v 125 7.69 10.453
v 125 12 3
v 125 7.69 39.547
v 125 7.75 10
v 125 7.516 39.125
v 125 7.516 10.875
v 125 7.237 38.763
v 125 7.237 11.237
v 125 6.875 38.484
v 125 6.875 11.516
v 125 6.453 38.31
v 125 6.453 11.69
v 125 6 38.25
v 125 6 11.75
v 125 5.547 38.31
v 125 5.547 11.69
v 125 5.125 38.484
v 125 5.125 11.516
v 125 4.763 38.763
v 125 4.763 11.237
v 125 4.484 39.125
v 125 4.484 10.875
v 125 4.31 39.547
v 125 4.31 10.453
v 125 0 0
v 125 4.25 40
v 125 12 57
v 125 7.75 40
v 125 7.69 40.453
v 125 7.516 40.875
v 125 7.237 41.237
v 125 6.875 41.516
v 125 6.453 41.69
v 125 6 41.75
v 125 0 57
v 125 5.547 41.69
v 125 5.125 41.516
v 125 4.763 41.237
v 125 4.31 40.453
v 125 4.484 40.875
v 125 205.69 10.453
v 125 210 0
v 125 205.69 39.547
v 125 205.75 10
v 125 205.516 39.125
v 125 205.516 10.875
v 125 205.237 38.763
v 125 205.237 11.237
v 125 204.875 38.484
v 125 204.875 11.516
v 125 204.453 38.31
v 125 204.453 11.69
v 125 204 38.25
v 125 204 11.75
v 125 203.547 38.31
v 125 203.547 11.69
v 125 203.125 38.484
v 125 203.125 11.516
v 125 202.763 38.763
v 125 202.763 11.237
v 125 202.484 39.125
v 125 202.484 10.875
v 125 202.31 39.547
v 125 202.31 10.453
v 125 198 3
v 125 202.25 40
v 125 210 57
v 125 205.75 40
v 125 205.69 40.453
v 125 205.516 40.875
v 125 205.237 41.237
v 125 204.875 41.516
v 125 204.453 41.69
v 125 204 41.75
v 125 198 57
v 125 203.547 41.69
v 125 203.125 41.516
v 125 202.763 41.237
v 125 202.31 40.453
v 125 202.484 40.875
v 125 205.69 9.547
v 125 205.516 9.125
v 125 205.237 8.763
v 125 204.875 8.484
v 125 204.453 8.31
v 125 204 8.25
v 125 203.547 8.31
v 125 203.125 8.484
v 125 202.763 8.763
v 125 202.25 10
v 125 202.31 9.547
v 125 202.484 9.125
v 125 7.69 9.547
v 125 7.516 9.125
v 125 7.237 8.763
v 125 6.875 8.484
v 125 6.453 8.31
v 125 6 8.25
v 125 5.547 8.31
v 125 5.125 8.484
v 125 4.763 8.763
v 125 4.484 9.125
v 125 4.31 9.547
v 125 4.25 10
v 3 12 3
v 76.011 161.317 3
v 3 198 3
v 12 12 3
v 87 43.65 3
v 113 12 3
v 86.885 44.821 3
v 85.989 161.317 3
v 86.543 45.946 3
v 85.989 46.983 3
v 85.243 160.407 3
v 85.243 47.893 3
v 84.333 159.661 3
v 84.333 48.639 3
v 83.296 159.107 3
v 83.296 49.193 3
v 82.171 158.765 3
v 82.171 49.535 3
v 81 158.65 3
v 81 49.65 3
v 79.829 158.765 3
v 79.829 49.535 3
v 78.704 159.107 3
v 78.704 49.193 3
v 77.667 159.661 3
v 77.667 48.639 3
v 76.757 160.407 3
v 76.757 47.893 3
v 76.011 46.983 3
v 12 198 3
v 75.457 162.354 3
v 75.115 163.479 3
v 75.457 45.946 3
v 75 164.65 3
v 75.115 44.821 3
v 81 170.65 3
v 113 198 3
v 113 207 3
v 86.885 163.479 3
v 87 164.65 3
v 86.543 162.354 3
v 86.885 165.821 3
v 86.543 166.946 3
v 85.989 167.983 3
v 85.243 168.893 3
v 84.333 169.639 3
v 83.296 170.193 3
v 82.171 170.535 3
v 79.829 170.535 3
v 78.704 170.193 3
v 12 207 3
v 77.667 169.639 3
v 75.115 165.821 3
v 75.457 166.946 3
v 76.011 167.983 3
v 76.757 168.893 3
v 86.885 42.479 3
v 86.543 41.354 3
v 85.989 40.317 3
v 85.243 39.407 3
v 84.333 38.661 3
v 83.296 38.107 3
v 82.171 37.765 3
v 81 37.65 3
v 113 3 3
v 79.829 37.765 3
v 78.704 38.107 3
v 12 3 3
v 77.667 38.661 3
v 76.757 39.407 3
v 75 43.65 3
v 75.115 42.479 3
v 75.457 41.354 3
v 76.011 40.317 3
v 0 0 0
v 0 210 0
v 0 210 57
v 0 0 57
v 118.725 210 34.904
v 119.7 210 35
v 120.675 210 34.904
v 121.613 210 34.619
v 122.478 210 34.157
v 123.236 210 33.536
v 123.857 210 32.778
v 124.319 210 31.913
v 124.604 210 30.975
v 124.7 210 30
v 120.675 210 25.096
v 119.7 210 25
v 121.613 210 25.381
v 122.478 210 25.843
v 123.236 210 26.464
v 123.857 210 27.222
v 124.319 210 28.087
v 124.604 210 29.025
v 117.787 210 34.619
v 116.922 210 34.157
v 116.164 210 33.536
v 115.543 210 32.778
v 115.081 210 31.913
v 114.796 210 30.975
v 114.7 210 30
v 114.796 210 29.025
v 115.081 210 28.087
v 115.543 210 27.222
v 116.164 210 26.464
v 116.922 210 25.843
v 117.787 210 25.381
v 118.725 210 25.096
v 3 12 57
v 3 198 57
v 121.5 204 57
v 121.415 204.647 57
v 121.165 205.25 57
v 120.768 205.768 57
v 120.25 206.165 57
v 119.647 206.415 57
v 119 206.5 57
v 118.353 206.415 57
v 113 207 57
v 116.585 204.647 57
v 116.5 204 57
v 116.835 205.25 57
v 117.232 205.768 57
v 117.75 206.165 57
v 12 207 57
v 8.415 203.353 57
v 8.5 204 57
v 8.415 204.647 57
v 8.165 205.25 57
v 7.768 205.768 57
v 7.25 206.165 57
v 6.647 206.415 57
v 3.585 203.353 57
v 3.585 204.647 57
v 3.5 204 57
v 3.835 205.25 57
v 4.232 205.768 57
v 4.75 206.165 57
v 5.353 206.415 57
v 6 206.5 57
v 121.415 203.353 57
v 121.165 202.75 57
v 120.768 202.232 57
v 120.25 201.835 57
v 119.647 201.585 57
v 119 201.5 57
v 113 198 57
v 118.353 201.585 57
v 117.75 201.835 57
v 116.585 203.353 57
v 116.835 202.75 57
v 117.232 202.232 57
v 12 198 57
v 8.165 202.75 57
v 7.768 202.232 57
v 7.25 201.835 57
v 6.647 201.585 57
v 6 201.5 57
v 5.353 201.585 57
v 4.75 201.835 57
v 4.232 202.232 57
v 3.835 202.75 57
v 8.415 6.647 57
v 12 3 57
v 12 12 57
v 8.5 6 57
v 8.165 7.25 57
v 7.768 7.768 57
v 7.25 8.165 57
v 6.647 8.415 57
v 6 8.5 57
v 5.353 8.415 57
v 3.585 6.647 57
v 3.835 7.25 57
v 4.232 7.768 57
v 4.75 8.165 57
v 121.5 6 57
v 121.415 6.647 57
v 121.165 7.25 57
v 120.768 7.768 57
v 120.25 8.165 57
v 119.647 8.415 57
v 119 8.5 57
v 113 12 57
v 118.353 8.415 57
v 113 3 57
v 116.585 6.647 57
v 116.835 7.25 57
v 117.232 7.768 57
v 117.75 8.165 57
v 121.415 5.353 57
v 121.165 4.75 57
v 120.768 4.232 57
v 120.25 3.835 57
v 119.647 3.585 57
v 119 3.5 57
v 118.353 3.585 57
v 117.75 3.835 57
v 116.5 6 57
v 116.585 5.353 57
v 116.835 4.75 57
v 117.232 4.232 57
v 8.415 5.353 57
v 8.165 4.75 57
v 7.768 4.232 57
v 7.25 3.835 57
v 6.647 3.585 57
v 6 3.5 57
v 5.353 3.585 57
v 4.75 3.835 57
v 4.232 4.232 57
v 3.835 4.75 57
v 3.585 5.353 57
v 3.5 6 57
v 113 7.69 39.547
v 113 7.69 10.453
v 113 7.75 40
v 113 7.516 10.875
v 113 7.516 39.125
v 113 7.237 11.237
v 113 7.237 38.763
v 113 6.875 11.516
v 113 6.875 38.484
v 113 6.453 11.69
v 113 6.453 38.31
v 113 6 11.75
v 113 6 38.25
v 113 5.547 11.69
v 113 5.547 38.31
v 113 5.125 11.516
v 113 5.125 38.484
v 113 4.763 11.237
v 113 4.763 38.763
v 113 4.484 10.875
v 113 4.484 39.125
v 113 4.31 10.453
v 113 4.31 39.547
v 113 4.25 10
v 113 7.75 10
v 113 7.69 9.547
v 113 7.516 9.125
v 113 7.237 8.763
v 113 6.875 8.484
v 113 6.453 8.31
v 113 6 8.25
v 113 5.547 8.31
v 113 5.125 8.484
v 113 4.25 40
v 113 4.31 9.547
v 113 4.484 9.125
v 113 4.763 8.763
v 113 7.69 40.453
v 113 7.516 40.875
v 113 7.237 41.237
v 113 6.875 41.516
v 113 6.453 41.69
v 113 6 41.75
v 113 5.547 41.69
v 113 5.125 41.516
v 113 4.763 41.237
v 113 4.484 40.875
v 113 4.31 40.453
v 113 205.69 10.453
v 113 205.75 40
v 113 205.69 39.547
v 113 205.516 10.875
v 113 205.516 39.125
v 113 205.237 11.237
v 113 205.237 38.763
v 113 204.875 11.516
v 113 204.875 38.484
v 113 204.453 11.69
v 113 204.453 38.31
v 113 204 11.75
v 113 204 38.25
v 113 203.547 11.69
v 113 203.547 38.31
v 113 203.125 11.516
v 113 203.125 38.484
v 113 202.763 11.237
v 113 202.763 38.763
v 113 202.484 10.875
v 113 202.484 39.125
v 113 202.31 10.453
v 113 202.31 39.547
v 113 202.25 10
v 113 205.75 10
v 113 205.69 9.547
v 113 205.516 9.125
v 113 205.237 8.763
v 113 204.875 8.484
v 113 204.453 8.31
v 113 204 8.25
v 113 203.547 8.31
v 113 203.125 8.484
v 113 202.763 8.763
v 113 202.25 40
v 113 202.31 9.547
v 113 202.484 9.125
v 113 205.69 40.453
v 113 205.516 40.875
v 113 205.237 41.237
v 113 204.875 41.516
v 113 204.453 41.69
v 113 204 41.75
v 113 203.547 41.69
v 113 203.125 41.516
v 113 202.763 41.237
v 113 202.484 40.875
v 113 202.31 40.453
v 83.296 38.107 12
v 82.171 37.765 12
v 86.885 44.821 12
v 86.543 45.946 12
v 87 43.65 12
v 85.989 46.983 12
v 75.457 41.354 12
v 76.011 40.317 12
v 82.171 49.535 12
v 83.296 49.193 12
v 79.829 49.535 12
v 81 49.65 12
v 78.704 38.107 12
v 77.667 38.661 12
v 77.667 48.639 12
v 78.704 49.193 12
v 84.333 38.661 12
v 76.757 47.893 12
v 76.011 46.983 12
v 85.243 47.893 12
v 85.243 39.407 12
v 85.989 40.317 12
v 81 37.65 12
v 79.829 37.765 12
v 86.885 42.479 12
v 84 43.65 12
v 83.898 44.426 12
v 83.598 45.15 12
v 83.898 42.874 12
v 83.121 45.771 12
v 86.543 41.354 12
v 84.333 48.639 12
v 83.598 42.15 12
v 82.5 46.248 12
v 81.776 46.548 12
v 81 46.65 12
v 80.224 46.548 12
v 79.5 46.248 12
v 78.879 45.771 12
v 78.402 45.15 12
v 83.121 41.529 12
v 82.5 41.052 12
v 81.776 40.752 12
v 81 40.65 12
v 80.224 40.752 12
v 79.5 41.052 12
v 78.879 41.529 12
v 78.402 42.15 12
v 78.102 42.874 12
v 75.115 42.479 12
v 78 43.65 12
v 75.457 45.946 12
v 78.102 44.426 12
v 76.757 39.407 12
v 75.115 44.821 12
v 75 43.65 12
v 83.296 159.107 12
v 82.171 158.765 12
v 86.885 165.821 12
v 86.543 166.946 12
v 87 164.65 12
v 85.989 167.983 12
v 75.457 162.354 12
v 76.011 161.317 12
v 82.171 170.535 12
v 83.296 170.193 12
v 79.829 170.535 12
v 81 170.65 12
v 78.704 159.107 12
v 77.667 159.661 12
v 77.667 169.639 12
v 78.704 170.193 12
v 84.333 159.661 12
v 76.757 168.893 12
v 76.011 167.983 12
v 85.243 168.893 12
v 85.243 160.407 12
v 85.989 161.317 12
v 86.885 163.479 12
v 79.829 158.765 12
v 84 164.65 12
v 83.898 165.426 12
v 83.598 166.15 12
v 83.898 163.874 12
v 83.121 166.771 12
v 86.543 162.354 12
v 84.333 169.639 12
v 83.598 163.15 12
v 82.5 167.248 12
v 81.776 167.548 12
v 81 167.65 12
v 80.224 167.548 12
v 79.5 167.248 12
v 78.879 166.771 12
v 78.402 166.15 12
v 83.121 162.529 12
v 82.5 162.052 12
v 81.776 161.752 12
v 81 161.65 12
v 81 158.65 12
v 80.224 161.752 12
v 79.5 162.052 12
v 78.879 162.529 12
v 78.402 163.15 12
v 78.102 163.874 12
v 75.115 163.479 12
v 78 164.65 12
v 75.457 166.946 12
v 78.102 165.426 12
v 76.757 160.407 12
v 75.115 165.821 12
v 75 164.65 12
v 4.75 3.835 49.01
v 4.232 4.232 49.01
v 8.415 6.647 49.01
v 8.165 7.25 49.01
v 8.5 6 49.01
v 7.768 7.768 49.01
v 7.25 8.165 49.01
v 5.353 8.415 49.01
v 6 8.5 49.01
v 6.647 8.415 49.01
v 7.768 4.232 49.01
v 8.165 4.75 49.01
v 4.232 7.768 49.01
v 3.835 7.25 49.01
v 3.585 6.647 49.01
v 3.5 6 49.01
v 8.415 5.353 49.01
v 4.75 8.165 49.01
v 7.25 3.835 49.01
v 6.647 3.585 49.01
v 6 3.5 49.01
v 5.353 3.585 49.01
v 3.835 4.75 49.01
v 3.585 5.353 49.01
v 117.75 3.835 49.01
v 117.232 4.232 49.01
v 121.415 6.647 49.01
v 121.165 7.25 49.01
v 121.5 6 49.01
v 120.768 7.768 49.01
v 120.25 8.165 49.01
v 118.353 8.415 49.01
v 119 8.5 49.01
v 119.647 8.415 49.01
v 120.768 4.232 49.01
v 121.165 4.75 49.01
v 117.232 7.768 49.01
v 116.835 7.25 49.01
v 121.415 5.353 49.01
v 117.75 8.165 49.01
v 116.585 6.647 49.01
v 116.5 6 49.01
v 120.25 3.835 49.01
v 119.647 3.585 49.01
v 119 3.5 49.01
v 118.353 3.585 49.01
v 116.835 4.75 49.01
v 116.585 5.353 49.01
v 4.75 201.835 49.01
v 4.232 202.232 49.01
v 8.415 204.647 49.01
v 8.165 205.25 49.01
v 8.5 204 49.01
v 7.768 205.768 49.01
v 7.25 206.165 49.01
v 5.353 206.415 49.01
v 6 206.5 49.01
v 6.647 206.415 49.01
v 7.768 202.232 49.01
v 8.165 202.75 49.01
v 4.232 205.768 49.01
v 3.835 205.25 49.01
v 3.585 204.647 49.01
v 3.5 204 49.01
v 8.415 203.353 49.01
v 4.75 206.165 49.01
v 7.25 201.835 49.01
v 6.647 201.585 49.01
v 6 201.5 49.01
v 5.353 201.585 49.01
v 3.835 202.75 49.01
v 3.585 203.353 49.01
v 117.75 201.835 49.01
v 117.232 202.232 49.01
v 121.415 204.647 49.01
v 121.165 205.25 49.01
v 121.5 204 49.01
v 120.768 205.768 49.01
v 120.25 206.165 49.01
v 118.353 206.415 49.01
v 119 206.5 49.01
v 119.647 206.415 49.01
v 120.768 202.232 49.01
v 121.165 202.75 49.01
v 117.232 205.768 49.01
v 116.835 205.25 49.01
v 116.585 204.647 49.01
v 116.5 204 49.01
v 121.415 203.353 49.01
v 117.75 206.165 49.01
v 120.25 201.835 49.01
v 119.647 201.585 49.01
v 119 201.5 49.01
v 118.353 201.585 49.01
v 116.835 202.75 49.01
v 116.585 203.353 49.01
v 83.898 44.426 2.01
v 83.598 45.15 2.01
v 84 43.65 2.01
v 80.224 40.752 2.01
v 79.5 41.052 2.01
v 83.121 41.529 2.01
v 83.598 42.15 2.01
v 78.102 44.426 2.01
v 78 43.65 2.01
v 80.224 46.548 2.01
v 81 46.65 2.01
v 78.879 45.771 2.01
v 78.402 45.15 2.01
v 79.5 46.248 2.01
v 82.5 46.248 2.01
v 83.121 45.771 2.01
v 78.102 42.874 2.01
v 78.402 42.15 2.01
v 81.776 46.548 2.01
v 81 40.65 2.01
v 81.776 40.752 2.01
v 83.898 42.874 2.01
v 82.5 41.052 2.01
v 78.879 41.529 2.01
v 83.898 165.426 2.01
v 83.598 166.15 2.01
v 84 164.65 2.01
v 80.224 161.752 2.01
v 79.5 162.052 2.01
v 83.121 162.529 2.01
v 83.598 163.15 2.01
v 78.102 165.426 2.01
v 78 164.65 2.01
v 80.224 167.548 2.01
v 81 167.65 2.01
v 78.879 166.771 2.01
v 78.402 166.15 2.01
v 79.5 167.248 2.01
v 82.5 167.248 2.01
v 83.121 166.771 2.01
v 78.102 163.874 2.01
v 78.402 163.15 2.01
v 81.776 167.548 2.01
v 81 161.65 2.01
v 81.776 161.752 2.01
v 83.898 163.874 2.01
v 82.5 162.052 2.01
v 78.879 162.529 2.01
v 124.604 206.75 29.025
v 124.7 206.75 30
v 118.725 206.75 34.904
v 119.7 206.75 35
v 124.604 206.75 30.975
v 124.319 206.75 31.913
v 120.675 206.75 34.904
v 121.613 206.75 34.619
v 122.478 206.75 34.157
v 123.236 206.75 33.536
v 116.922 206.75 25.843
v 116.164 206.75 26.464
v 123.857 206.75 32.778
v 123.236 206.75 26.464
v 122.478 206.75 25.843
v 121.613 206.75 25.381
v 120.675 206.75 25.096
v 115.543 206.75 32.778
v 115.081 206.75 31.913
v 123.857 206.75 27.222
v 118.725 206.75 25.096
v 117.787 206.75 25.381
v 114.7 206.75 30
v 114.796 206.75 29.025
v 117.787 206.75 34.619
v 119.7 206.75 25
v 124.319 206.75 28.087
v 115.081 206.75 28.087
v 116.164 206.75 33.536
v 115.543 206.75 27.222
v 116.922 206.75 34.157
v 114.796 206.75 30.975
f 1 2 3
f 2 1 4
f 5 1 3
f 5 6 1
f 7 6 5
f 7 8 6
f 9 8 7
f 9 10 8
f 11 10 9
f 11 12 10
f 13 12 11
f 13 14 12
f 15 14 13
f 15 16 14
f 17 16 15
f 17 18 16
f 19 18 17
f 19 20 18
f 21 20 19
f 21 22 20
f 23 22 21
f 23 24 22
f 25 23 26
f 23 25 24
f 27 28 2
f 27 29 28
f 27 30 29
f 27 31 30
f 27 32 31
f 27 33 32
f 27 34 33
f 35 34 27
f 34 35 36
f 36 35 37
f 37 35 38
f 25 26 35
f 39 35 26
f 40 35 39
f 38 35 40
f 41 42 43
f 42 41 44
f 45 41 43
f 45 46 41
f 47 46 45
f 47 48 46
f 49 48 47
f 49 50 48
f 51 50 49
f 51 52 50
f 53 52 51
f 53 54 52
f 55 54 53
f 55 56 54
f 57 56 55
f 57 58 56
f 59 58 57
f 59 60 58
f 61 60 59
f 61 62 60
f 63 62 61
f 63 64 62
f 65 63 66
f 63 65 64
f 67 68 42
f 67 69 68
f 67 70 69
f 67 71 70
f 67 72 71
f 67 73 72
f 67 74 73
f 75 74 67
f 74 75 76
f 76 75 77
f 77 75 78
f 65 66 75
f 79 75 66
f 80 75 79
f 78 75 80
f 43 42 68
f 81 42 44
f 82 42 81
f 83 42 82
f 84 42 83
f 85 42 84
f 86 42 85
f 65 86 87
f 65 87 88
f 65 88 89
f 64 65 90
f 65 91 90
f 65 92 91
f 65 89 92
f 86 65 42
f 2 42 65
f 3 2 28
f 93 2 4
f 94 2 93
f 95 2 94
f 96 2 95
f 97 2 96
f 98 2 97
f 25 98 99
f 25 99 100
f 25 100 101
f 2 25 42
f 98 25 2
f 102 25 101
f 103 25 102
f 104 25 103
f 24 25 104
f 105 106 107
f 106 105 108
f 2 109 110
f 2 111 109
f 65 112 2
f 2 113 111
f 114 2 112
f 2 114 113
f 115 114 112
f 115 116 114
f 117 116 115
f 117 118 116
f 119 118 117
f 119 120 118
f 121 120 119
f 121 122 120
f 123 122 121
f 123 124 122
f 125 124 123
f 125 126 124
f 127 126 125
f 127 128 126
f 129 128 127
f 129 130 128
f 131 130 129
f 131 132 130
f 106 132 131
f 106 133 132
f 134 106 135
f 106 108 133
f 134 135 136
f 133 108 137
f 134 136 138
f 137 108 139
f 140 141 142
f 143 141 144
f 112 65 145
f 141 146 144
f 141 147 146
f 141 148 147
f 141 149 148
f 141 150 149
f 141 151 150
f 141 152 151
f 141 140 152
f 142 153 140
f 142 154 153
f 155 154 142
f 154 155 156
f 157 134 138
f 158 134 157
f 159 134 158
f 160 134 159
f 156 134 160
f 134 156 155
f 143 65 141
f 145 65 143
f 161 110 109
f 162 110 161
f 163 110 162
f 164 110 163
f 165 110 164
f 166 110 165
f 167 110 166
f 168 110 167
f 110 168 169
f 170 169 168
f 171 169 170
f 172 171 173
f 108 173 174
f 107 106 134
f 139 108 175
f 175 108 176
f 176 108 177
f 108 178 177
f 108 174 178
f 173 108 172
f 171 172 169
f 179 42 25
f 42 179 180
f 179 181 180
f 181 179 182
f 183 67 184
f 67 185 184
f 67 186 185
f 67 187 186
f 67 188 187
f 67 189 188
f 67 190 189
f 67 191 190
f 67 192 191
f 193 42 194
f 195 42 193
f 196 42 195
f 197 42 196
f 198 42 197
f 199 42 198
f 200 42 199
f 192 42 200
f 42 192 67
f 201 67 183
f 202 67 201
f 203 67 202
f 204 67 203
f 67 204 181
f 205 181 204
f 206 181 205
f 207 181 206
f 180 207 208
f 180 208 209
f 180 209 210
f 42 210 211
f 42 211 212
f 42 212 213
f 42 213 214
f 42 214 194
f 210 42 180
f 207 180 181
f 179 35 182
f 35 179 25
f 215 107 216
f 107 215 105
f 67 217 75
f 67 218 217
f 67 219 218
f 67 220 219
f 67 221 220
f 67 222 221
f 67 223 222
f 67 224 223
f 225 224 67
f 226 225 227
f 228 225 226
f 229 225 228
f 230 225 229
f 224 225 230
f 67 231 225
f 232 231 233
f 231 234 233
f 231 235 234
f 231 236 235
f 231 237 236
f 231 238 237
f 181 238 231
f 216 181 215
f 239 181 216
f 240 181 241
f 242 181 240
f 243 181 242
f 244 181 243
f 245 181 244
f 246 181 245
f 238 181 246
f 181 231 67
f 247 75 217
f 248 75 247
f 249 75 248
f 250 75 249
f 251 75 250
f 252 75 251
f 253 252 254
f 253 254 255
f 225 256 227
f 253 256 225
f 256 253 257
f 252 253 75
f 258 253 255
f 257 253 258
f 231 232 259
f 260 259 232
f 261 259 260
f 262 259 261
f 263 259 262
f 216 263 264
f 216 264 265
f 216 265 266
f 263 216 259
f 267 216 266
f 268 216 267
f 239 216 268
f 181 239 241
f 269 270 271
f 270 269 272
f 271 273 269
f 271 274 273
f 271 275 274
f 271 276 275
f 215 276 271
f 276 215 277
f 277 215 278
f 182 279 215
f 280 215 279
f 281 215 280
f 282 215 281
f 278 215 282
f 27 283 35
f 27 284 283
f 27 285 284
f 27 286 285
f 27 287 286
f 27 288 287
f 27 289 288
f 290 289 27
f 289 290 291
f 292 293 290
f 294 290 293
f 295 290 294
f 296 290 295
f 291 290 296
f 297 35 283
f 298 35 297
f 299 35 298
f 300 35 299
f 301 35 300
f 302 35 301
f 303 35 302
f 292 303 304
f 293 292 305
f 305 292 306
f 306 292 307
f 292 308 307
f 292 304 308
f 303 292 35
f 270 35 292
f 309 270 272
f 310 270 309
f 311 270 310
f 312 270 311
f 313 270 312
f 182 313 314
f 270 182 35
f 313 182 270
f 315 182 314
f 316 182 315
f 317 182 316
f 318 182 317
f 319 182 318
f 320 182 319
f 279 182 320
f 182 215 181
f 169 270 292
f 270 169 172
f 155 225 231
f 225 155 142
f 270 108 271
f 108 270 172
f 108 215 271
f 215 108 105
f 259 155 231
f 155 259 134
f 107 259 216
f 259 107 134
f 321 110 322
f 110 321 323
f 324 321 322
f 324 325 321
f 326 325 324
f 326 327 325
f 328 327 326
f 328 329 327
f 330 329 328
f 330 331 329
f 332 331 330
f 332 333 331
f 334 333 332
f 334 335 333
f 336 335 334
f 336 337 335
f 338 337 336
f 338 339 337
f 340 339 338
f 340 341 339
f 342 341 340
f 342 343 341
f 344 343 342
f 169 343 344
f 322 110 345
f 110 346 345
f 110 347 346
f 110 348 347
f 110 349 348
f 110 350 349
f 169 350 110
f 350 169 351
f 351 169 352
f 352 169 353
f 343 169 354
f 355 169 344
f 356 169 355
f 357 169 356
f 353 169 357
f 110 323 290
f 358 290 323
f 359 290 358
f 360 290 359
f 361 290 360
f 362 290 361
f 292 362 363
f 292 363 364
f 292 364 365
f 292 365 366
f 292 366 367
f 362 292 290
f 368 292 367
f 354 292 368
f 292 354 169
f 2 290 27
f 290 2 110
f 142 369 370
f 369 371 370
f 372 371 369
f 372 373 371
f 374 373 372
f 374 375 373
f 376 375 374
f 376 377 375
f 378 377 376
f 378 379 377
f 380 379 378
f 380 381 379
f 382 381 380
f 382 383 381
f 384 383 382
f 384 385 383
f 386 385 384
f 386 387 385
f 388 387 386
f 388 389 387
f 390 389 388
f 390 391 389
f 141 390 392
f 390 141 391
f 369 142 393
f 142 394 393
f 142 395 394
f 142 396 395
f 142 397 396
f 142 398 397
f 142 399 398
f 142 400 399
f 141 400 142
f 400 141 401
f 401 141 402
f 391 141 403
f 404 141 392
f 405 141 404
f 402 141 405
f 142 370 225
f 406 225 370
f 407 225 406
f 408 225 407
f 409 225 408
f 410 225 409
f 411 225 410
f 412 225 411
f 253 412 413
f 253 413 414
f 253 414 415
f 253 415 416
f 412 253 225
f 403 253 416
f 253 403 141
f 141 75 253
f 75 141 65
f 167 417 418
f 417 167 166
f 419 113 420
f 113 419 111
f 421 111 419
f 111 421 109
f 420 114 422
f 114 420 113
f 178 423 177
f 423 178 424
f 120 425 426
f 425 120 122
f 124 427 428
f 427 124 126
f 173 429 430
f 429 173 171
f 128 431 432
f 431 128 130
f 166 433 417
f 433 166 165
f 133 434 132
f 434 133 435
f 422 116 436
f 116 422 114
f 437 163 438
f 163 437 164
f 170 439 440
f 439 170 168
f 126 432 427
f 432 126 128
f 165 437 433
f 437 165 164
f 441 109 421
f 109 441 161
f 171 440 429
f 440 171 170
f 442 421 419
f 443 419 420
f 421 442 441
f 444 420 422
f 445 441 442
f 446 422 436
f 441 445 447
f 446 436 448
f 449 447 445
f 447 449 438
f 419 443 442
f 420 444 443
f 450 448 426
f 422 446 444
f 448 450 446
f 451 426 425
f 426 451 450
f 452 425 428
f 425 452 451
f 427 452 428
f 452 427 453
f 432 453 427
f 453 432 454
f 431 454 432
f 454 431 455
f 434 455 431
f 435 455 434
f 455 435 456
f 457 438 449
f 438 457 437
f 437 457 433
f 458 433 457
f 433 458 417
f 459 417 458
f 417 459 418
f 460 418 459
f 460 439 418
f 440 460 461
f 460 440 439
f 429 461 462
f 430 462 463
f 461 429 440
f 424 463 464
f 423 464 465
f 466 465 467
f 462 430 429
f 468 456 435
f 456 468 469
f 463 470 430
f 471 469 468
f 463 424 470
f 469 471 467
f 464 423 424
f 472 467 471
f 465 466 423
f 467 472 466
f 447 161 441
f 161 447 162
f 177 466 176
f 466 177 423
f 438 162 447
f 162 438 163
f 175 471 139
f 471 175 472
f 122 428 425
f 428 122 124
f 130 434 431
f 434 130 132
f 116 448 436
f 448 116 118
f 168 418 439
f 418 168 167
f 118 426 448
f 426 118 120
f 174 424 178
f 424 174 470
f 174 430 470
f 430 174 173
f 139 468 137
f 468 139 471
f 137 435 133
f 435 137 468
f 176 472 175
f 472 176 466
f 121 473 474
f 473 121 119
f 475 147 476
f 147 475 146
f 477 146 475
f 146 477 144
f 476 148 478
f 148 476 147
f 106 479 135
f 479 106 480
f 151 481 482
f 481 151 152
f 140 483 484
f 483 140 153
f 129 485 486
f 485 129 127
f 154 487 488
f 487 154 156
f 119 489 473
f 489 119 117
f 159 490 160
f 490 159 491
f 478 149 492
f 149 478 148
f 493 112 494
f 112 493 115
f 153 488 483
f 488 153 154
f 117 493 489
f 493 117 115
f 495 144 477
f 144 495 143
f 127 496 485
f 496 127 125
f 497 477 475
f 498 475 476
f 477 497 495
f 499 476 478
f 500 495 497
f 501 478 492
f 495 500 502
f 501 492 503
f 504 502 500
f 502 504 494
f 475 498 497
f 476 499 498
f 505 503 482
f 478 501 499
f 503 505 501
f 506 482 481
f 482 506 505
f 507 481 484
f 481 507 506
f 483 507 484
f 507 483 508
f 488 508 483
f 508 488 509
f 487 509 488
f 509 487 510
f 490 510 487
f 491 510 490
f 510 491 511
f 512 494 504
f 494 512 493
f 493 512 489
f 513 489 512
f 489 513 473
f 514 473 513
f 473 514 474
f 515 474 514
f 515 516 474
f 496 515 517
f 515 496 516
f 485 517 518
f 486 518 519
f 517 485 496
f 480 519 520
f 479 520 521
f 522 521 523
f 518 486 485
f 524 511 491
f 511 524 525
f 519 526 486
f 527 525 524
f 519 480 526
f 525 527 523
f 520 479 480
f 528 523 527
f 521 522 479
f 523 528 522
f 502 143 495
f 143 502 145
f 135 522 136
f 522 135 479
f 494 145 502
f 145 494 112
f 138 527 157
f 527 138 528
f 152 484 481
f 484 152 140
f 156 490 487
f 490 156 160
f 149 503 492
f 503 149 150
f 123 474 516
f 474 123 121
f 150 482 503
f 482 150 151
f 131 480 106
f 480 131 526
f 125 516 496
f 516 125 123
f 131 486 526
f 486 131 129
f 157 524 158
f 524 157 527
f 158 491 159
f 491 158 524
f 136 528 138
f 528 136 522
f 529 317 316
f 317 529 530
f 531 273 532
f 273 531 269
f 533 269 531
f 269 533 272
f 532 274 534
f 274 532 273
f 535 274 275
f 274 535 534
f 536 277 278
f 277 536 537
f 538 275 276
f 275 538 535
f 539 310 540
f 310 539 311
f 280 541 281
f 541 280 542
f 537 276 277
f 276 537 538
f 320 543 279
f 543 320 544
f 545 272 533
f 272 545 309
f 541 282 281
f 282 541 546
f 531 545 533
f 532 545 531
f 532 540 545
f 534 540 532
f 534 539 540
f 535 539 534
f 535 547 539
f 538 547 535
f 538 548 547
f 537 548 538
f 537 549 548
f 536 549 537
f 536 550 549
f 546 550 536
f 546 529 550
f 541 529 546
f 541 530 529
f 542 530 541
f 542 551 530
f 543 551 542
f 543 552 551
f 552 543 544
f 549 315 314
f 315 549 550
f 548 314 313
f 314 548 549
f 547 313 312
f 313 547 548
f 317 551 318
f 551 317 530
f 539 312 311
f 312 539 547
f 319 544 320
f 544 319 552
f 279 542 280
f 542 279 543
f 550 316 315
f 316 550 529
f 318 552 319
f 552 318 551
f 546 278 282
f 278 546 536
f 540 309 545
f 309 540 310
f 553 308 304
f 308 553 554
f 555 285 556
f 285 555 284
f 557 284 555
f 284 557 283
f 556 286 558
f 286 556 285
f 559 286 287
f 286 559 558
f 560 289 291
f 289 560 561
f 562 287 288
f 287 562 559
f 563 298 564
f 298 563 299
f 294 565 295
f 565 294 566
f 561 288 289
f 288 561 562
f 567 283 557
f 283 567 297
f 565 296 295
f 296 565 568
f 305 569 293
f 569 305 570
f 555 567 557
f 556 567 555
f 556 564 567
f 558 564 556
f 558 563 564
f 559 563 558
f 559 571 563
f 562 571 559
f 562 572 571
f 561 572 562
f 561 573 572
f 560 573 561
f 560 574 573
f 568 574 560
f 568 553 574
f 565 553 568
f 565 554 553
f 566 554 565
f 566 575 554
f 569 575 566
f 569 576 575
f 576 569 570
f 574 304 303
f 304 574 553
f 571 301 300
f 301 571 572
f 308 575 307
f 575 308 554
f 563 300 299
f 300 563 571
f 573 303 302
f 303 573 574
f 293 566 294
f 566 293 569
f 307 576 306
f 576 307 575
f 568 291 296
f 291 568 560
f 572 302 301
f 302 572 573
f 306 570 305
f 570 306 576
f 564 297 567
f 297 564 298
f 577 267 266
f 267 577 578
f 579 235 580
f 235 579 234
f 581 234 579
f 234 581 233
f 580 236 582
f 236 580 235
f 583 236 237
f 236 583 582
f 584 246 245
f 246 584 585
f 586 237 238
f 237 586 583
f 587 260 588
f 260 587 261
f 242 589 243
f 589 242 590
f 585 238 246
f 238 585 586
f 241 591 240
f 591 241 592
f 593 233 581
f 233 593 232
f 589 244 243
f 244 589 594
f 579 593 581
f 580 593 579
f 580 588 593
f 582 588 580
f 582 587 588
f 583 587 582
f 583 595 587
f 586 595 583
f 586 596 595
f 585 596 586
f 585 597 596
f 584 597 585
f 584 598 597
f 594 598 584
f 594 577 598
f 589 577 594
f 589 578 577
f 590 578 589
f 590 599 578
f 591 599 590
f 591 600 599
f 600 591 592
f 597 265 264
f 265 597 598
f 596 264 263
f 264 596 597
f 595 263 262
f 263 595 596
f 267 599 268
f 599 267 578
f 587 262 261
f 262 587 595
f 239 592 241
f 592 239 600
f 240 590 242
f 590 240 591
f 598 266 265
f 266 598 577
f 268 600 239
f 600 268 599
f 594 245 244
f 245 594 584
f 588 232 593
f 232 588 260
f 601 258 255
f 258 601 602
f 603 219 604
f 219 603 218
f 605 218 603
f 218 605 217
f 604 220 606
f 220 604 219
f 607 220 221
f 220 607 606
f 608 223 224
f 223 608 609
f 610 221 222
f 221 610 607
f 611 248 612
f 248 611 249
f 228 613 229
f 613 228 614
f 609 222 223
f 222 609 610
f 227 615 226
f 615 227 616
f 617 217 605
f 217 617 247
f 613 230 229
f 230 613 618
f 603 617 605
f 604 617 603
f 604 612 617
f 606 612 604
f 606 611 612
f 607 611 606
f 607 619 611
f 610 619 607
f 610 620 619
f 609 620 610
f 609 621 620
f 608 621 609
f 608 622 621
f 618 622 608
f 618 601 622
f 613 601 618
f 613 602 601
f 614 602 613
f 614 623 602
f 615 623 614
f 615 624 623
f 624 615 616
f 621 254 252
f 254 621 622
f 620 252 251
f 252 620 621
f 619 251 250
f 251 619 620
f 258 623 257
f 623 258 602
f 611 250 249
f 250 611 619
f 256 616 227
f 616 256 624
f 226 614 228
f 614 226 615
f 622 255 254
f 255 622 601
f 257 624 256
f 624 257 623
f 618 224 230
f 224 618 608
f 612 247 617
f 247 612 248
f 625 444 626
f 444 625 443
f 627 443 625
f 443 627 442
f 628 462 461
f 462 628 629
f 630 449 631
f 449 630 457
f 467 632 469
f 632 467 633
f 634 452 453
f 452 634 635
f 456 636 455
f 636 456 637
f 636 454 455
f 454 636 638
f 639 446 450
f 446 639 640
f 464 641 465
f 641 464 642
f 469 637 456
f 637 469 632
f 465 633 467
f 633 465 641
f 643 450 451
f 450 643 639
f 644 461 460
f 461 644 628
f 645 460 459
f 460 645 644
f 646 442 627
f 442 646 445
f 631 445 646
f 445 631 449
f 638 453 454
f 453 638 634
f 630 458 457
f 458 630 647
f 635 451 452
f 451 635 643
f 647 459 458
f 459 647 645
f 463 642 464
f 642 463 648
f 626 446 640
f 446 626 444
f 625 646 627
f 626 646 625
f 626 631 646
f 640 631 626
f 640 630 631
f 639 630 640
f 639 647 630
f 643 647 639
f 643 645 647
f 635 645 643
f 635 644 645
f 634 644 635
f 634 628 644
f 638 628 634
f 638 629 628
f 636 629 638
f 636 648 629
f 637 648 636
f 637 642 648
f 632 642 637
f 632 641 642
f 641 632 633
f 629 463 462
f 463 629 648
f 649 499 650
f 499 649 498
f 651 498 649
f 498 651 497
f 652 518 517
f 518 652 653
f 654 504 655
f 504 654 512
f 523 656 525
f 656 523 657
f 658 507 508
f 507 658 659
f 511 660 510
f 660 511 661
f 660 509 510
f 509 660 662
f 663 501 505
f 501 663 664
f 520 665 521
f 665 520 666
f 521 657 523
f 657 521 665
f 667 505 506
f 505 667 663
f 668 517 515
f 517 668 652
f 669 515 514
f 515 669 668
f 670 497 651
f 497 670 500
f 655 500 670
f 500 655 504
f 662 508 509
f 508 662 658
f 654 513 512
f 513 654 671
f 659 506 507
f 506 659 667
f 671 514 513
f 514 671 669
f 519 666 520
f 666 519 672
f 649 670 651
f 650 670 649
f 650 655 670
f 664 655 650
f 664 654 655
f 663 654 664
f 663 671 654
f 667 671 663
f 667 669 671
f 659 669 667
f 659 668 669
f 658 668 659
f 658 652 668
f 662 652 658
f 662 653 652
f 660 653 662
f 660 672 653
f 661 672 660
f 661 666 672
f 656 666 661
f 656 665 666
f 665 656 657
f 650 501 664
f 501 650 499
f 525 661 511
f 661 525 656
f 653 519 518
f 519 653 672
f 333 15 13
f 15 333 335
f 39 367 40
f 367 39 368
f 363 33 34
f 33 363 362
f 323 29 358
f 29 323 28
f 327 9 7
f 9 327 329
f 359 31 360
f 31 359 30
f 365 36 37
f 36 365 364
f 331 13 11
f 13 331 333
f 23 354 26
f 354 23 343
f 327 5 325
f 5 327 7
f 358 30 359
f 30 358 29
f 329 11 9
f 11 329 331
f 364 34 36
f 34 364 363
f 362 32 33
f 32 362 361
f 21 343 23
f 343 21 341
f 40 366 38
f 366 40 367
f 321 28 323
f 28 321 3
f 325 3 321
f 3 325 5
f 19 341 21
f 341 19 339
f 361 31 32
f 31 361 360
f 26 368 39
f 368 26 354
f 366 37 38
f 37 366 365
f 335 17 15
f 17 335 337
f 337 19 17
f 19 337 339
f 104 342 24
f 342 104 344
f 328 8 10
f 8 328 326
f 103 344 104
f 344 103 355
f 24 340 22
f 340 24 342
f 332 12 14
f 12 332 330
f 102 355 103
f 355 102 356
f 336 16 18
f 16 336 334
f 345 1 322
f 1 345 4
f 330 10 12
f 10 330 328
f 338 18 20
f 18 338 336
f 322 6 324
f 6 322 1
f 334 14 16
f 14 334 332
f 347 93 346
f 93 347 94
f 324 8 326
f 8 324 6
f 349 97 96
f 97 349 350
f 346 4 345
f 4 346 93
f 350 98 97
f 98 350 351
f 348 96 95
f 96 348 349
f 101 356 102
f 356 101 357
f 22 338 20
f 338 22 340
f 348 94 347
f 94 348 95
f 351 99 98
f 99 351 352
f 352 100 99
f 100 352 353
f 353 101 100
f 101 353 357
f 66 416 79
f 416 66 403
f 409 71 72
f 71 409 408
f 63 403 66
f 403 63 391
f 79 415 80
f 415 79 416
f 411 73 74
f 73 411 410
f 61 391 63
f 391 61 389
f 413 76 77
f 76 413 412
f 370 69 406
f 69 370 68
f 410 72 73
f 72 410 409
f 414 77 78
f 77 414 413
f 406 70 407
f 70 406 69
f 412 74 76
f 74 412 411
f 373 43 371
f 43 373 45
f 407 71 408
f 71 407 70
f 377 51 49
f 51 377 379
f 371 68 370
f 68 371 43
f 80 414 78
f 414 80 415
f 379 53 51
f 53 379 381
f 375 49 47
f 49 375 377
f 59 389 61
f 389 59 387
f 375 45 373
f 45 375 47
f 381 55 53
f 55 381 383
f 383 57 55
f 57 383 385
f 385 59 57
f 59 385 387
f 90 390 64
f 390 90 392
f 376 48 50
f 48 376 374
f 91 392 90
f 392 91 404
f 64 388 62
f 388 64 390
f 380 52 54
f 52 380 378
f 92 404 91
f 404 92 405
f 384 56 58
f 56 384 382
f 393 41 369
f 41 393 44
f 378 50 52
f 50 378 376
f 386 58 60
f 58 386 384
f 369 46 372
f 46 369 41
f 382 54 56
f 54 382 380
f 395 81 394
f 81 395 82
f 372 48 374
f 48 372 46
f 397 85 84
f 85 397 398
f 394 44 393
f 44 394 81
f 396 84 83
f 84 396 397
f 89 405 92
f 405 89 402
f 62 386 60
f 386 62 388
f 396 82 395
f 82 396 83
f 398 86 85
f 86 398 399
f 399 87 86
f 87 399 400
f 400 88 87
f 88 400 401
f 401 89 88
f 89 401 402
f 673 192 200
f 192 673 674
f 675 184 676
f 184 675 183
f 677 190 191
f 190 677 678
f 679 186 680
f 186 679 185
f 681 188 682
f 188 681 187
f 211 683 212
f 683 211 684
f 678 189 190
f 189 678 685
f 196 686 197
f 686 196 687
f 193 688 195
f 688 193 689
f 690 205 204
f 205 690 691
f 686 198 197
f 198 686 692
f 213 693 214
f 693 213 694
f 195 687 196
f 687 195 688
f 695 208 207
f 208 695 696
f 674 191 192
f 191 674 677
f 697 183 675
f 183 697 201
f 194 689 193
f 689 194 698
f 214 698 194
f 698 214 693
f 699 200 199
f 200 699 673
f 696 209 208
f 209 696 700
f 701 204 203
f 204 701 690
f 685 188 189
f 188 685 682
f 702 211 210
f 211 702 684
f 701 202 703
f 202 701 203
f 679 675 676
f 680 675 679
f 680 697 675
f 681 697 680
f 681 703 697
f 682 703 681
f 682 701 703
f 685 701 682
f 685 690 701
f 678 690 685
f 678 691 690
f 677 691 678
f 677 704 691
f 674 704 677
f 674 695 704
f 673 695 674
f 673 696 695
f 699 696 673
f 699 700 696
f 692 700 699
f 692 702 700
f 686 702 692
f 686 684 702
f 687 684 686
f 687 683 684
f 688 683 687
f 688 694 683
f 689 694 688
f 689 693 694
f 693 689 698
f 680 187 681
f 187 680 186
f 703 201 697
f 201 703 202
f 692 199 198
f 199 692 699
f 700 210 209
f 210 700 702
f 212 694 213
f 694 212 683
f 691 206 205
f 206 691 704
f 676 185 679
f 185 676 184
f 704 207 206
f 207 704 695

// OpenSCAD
// Outer-case half for the ODJ controller.
//
// Two halves (LEFT + RIGHT) bolt together. Once the USB hole was
// pinned to the Pico's connector (asymmetric across the seam), the
// halves are no longer interchangeable, so we use that asymmetry:
//   - LEFT  half: USB cable exit + M3 bolt CLEARANCE holes at seam.
//   - RIGHT half: no USB hole + M3 heat-set INSERTS at seam.
// Set `side` below to "L" or "R" and re-render to export each STL.
//
// PCB sits horizontally between them, straddling the seam. Each
// half's INNER long wall is missing — that's the open face that
// meets its partner.
//
// Top-down view, assembled:
//
//   +----------------+----------------+
//   |                |                |   ← faceplate (separate, bolts on top)
//   |   Half A       |   Half B       |
//   |   (this file)  |   (this file,  |
//   |                |    flipped     |
//   |                |    in mirror)  |
//   +----------------+----------------+
//
// Print the part with the FLOOR on the build plate — i.e., right-side
// up. The open inner long wall (X = half_w) is then a side opening,
// printable without supports. The four corner pillars print solid
// because they extend the full height from floor to top.
//
// To assemble: print twice, slide PCB horizontally onto the M5
// posts (no inserts — M5 self-taps into the PETG/ABS print, light
// PCB doesn't need more), bolt the two halves together with 4 × M3
// hex bolts + nuts through the inner corner pillars (one bolt at
// each pillar's top + bottom = 4 total), then bolt the faceplate
// on top with 4 × M3 self-tap screws into the corner posts.

// ====================================================================
// Parameters
// ====================================================================

side          = "L";     // "L" (left, has USB + clearance holes) or
                         // "R" (right, has insert pockets, no USB)

half_w        = 125;     // X, half width (one deck's faceplate width)
half_l        = 210;     // Y, half length (one deck's faceplate length)
half_h        = 60;      // Z, total assembled height including faceplate
wall_t        = 3;       // outer wall thickness
floor_t       = 3;       // floor thickness
faceplate_t   = 3;       // (informational) — faceplate sits IN a top recess

// --- Corner posts (carry the faceplate + the seam bolts) ---
post_size     = 12;      // square cross-section, X = Y
post_h        = half_h - faceplate_t;   // up to where faceplate sits

// --- Faceplate corner screw mounts (mirror faceplate_deck.scad) ---
// Modelled for a brass heat-set insert: melt-in OD 5.5 mm, depth 8 mm.
// Hole is drawn 0.5 mm under that so the insert has plastic to displace
// as it sinks (standard heat-set practice — Ruthex / McMaster default).
fp_corner_inset = 6;     // from outer corner — matches faceplate's mount holes
fp_pilot_d      = 5;     // heat-set insert hole (target insert OD 5.5)
fp_pilot_depth  = 8;

// --- Inner-corner seam fastening (horizontal M3) ---
// LEFT half has a clearance hole through the full pillar depth.
// RIGHT half has a heat-set insert pocket on the seam-facing face.
// Bolt enters from inside the LEFT cavity, passes through the
// clearance hole, engages the insert on the RIGHT side.
seam_bolt_clr     = 3.5;   // M3 clearance through LEFT pillar
seam_insert_d     = 4;     // model hole for M3 heat-set insert (typical OD ~4.5)
seam_insert_depth = 5;     // insert pocket depth into the RIGHT pillar
seam_bolt_top_z   = post_h - 17;   // upper bolt (clears the faceplate pilot above)
seam_bolt_bot_z   = 10;            // lower bolt

// --- PCB mounts (horizontal, M5 heat-set insert) ---
// Posts only need to be tall enough to contain the heat-set insert
// + a couple mm of solid plastic at the base. 10 mm insert depth +
// 2 mm base = 12 mm post height. Putting the PCB this close to the
// floor leaves more headroom above for tall components (USB,
// JST headers) while the PCB itself has its underside 12 mm above
// the floor — plenty of clearance for solder fillets.
pcb_z         = 12;      // PCB bottom face Z (top of mount post)
pcb_post_x    = 81;      // half-local X (44 mm from seam — derived above)
// Y values are PCB-coord (30, 151) + 13.65 mm offset to centre the
// 135-mm-tall PCB in the 210-mm-long case. Clearance to the front /
// back pillars is ~25 mm at each end.
pcb_post_y_a  = 43.65;
pcb_post_y_b  = 164.65;
pcb_post_dia  = 12;      // boss outer — 3 mm wall around the 6 mm hole
pcb_pilot_d   = 6;       // heat-set insert hole (target insert OD 6.5)
pcb_pilot_depth = 10;

// --- USB cable cutout (full circle through the BACK wall only) ---
// LEFT half only — RIGHT half has solid back wall here.
//
// Position: 43 mm from the PCB's left outline edge (PCB-coord X = 29) =
//   PCB-coord X = 72 = case-X 119.7 (with the PCB centred on the seam
//   at case-X 125). Half-local X is identical: 119.7. The cylinder
//   edge at X = 124.7 is 0.3 mm clear of the seam — fully inside one
//   half so the hole renders as a complete circle.
//
// The cylinder length is wall_t + 0.5 mm: enough to punch cleanly
// through the wall without rendering slivers, just 0.25 mm into the
// pillar behind it — visually a wall-only cut.
usb_at_back   = true;    // true = Y = half_l, false = Y = 0
usb_d         = 10;
usb_x         = 119.7;   // half-local — aligns with Pico USB at PCB-X 72
usb_center_z  = pcb_z + 18;   // 18 mm above PCB bottom
usb_wall_h    = wall_t + 0.5; // cylinder length — wall only, just slop

// ====================================================================
// Geometry helpers
// ====================================================================

EPS = 0.01;

module corner_post(x, y) {
    translate([x - post_size/2, y - post_size/2, 0])
        cube([post_size, post_size, post_h]);
}

// Vertical M3 self-tap pilot from the post's top down — fastens faceplate.
module fp_pilot(x, y) {
    translate([x, y, post_h - fp_pilot_depth + EPS])
        cylinder(d = fp_pilot_d, h = fp_pilot_depth, $fn = 24);
}

// PCB mount boss — solid pillar from floor up to pcb_z, with M5 self-
// tap pilot drilled into the top.
module pcb_post(x, y) {
    translate([x, y, 0]) {
        cylinder(d = pcb_post_dia, h = pcb_z, $fn = 32);
    }
}
module pcb_pilot(x, y) {
    translate([x, y, pcb_z - pcb_pilot_depth + EPS])
        cylinder(d = pcb_pilot_d, h = pcb_pilot_depth, $fn = 24);
}

// Horizontal seam fastener at an inner-corner post. LEFT half gets a
// full-depth clearance hole (bolt slides through). RIGHT half gets a
// short insert pocket on the seam-facing face (bolt threads into the
// heat-set insert that lives here).
module seam_bolt(y, z) {
    if (side == "L") {
        translate([half_w + EPS, y, z]) rotate([0, -90, 0])
            cylinder(d = seam_bolt_clr, h = post_size + 2 * EPS, $fn = 24);
    } else {
        // Insert opens at the seam face (X = half_w) and extends inward
        // (toward X < half_w) by `seam_insert_depth`.
        translate([half_w + EPS, y, z]) rotate([0, -90, 0])
            cylinder(d = seam_insert_d, h = seam_insert_depth + EPS, $fn = 32);
    }
}

// ====================================================================
// Build
// ====================================================================

module case_half() {
    difference() {
        union() {
            // Floor.
            cube([half_w, half_l, floor_t]);
            // Outer wall (X = 0).
            cube([wall_t, half_l, post_h]);
            // Front wall (Y = 0).
            cube([half_w, wall_t, post_h]);
            // Back wall (Y = half_l).
            translate([0, half_l - wall_t, 0])
                cube([half_w, wall_t, post_h]);
            // Note: the inner long wall (X = half_w) is INTENTIONALLY
            // absent — that's the open face that meets the other half.
            //
            // Four corner posts running full height. They carry both
            // the faceplate screws and the seam bolts (at the inner
            // two posts).
            corner_post(post_size/2,             post_size/2);              // outer-front
            corner_post(post_size/2,             half_l - post_size/2);     // outer-back
            corner_post(half_w - post_size/2,    post_size/2);              // inner-front (seam)
            corner_post(half_w - post_size/2,    half_l - post_size/2);     // inner-back  (seam)
            // PCB mount bosses.
            pcb_post(pcb_post_x, pcb_post_y_a);
            pcb_post(pcb_post_x, pcb_post_y_b);
        }

        // ---- Faceplate corner screw pilot holes ----
        // Faceplate mounting holes (from faceplate_deck.scad) are at
        //   (corner_inset, corner_inset) etc., where corner_inset = 6.
        fp_pilot(fp_corner_inset,           fp_corner_inset);
        fp_pilot(half_w - fp_corner_inset,  fp_corner_inset);
        fp_pilot(fp_corner_inset,           half_l - fp_corner_inset);
        fp_pilot(half_w - fp_corner_inset,  half_l - fp_corner_inset);

        // ---- PCB self-tap pilots ----
        pcb_pilot(pcb_post_x, pcb_post_y_a);
        pcb_pilot(pcb_post_x, pcb_post_y_b);

        // ---- Seam bolts: two per inner pillar (top + bottom) ----
        // The bolts pass through THIS half's inner post and continue
        // into the mirrored half's post. With identical halves the two
        // pillars line up edge-to-edge at X = half_w.
        seam_bolt(post_size/2,              seam_bolt_top_z);
        seam_bolt(post_size/2,              seam_bolt_bot_z);
        seam_bolt(half_l - post_size/2,     seam_bolt_top_z);
        seam_bolt(half_l - post_size/2,     seam_bolt_bot_z);

        // ---- USB cable cutout — LEFT half only ----
        // Cylinder length = wall thickness + 0.5 mm slop, so it punches
        // through wall but barely (<0.25 mm) into the pillar behind it.
        if (side == "L") {
            usb_y = usb_at_back ? half_l - wall_t/2 : wall_t/2;
            translate([usb_x, usb_y, usb_center_z])
                rotate([90, 0, 0])
                    cylinder(d = usb_d, h = usb_wall_h, center = true, $fn = 32);
        }
    }
}

// Render one half. Edit `side` at the top of the file to switch
// between LEFT ("L") and RIGHT ("R") and re-export each STL.
//
// To preview both halves assembled, uncomment the visualisation block
// below — it draws the OTHER half mirrored alongside this one.
case_half();

// // --- visualisation only: mate of the chosen side ---
// color("LightBlue", 0.5) translate([2 * half_w, 0, 0])
//     mirror([1, 0, 0]) {
//         // temporary local override of `side` is awkward in SCAD —
//         // easier to comment the line above and uncomment one of:
//         // (run once with side="L", once with side="R")
//         case_half();
//     }
